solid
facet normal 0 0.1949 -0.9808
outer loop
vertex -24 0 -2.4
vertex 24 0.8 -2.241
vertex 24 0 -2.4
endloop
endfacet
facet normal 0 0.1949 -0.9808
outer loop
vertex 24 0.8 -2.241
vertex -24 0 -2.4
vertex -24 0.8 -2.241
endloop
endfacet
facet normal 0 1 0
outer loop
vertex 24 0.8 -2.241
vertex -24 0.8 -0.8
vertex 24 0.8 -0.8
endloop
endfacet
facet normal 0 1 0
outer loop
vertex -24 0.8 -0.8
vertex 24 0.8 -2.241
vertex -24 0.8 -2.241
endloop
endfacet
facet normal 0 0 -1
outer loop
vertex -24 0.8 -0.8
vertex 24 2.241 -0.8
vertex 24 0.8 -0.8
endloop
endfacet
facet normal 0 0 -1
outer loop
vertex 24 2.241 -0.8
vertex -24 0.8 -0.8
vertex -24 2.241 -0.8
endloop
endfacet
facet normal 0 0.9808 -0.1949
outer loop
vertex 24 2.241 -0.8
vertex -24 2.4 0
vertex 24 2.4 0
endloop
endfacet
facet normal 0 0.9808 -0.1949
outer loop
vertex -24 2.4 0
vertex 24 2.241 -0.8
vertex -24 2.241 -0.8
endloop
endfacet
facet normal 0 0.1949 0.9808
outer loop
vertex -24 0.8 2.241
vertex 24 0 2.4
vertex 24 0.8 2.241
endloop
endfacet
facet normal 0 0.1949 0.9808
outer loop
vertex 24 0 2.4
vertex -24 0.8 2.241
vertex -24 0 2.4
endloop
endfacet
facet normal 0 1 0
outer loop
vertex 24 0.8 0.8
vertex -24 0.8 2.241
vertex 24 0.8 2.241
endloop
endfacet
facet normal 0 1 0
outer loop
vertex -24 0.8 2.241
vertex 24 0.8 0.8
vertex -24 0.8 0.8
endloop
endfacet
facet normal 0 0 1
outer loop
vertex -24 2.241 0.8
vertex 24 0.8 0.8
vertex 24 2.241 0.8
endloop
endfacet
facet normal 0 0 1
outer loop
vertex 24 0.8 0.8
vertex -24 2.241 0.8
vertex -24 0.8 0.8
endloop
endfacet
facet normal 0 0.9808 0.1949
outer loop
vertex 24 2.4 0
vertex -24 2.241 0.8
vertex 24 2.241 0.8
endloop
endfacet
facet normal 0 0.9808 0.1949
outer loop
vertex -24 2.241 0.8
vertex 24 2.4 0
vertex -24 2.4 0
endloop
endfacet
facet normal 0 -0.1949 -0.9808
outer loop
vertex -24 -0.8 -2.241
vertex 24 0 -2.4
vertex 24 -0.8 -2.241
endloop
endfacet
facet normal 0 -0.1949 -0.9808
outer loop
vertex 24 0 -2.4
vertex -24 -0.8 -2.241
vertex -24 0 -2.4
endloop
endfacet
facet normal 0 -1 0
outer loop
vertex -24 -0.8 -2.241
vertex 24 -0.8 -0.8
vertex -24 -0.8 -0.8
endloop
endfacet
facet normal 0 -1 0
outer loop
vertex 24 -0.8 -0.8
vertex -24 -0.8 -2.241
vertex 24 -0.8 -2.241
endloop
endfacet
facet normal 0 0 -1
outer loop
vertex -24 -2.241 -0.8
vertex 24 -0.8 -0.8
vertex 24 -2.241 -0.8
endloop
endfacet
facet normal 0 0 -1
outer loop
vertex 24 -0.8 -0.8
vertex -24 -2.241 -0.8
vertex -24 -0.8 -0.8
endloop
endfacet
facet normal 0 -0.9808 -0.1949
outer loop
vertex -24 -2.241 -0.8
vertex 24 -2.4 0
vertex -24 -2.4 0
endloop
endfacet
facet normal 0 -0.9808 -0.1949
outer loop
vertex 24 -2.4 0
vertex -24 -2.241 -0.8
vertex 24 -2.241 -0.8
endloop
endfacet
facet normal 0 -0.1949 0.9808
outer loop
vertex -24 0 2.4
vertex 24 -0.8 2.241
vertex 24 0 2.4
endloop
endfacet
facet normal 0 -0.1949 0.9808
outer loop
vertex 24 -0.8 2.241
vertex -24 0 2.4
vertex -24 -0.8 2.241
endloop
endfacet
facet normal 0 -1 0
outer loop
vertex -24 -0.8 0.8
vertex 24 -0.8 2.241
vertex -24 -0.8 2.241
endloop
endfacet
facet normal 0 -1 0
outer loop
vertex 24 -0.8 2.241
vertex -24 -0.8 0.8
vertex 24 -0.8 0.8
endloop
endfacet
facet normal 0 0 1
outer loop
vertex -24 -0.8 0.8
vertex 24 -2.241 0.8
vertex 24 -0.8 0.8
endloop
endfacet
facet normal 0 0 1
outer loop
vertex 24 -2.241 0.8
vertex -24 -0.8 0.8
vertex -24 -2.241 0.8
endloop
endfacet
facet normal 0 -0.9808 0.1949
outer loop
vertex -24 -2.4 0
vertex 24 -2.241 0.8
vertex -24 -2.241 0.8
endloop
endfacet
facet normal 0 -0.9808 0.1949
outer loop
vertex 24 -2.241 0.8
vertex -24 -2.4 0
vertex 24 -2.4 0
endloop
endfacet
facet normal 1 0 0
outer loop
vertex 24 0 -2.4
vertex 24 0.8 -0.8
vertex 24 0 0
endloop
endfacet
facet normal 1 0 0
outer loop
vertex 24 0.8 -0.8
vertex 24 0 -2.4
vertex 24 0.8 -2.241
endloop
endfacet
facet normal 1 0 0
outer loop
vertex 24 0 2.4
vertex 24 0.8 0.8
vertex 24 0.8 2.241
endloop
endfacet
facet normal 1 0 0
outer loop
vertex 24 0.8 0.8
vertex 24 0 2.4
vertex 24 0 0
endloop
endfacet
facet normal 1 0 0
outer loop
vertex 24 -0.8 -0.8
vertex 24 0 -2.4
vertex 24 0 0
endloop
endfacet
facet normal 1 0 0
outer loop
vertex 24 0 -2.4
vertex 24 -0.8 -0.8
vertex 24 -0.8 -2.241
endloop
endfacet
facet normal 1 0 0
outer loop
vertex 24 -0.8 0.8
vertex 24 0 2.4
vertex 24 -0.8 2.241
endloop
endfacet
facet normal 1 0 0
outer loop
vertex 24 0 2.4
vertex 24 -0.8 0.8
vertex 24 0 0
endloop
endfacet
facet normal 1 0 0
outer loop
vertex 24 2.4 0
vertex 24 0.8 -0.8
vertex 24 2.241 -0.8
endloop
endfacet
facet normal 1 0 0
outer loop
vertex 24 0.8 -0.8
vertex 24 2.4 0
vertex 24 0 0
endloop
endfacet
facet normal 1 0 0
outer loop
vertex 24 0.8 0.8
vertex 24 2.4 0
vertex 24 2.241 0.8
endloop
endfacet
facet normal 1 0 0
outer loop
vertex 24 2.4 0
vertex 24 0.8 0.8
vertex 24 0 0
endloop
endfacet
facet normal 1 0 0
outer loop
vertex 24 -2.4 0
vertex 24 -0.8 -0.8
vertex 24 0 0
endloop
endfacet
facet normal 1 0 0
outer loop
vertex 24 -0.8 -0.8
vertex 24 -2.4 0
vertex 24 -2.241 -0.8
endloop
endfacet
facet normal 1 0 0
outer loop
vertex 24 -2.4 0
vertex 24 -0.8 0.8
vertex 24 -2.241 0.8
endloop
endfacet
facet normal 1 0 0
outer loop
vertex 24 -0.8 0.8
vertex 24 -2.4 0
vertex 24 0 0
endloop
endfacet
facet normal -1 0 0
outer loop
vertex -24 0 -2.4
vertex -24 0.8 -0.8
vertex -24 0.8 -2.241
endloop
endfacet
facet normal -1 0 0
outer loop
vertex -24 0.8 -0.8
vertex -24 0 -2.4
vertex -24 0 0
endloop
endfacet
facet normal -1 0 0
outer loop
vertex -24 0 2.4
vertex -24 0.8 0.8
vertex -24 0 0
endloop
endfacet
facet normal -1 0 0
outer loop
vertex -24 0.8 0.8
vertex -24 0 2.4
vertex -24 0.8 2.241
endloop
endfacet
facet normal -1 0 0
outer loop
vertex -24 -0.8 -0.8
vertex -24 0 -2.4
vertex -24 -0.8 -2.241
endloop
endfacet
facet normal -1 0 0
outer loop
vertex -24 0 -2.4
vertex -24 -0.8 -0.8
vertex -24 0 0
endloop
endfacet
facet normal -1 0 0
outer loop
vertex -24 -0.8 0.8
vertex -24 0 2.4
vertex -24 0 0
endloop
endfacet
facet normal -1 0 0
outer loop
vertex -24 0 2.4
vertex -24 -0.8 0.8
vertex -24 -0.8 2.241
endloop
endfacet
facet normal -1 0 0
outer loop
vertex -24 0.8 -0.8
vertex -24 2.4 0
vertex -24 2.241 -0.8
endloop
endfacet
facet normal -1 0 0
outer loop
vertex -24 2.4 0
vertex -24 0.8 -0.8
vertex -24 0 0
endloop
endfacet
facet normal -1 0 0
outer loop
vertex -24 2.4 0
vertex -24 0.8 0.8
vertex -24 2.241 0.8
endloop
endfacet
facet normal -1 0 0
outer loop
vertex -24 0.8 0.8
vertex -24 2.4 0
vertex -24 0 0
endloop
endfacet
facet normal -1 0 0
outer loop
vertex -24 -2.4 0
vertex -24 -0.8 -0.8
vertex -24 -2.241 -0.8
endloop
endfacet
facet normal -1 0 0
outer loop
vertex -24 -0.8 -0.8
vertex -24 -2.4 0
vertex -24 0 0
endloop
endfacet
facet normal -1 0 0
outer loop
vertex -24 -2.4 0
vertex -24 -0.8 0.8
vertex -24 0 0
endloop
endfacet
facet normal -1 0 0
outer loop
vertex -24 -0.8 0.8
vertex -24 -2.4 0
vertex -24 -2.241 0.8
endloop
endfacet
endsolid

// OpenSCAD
// file: ../p/axle.scad
use <../lib.scad>
function ldraw_lib__axle() = [
// 0 Axle
// 0 Name: axle.dat
// 0 Author: James Jessiman
// 0 !LDRAW_ORG Primitive UPDATE 2003-01
// 0 !LICENSE Licensed under CC BY 4.0 : see CAreadme.txt
// 
// 0 BFC CERTIFY CCW
  [0,"BFC","CERTIFY"],
  [0,"BFC","CCW"],
// 
// 0 !HISTORY 2000-04-23 [sbliss] Added conditional edges along outermost diameters
// 0 !HISTORY 2000-05-07 [PTadmin] Official Update 2000-01
// 0 !HISTORY 2002-11-08 [OrionP] Adjusted fit and precision
// 0 !HISTORY 2003-03-12 [PTadmin] Official Update 2003-01
// 0 !HISTORY 2007-06-24 [PTadmin] Header formatted for Contributor Agreement
// 0 !HISTORY 2008-07-01 [PTadmin] Official Update 2008-01
// 
// 
// 5 24 6 0 0 6 1 0 5.602 0 2 5.602 0 -2
  [5,24,6,0,0,6,1,0,5.602,0,2,5.602,0,-2],
// 5 24 0 0 6 0 1 6 2 0 5.602 -2 0 5.602
  [5,24,0,0,6,0,1,6,2,0,5.602,-2,0,5.602],
// 5 24 -6 0 0 -6 1 0 -5.602 0 -2 -5.602 0 2
  [5,24,-6,0,0,-6,1,0,-5.602,0,-2,-5.602,0,2],
// 5 24 0 0 -6 0 1 -6 -2 0 -5.602 2 0 -5.602
  [5,24,0,0,-6,0,1,-6,-2,0,-5.602,2,0,-5.602],
// 
// 2 24 6 0 0 5.602 0 2
  [2,24,6,0,0,5.602,0,2],
// 2 24 5.602 0 2 2 0 2
  [2,24,5.602,0,2,2,0,2],
// 2 24 2 0 2 2 0 5.602
  [2,24,2,0,2,2,0,5.602],
// 2 24 2 0 5.602 0 0 6
  [2,24,2,0,5.602,0,0,6],
// 2 24 -6 0 0 -5.602 0 2
  [2,24,-6,0,0,-5.602,0,2],
// 2 24 -5.602 0 2 -2 0 2
  [2,24,-5.602,0,2,-2,0,2],
// 2 24 -2 0 2 -2 0 5.602
  [2,24,-2,0,2,-2,0,5.602],
// 2 24 -2 0 5.602 -0 0 6
  [2,24,-2,0,5.602,-0,0,6],
// 2 24 6 0 -0 5.602 0 -2
  [2,24,6,0,-0,5.602,0,-2],
// 2 24 5.602 0 -2 2 0 -2
  [2,24,5.602,0,-2,2,0,-2],
// 2 24 2 0 -2 2 0 -5.602
  [2,24,2,0,-2,2,0,-5.602],
// 2 24 2 0 -5.602 0 0 -6
  [2,24,2,0,-5.602,0,0,-6],
// 2 24 -6 0 -0 -5.602 0 -2
  [2,24,-6,0,-0,-5.602,0,-2],
// 2 24 -5.602 0 -2 -2 0 -2
  [2,24,-5.602,0,-2,-2,0,-2],
// 2 24 -2 0 -2 -2 0 -5.602
  [2,24,-2,0,-2,-2,0,-5.602],
// 2 24 -2 0 -5.602 -0 0 -6
  [2,24,-2,0,-5.602,-0,0,-6],
// 2 24 6 1 0 5.602 1 2
  [2,24,6,1,0,5.602,1,2],
// 2 24 5.602 1 2 2 1 2
  [2,24,5.602,1,2,2,1,2],
// 2 24 2 1 2 2 1 5.602
  [2,24,2,1,2,2,1,5.602],
// 2 24 2 1 5.602 0 1 6
  [2,24,2,1,5.602,0,1,6],
// 2 24 -6 1 0 -5.602 1 2
  [2,24,-6,1,0,-5.602,1,2],
// 2 24 -5.602 1 2 -2 1 2
  [2,24,-5.602,1,2,-2,1,2],
// 2 24 -2 1 2 -2 1 5.602
  [2,24,-2,1,2,-2,1,5.602],
// 2 24 -2 1 5.602 -0 1 6
  [2,24,-2,1,5.602,-0,1,6],
// 2 24 6 1 -0 5.602 1 -2
  [2,24,6,1,-0,5.602,1,-2],
// 2 24 5.602 1 -2 2 1 -2
  [2,24,5.602,1,-2,2,1,-2],
// 2 24 2 1 -2 2 1 -5.602
  [2,24,2,1,-2,2,1,-5.602],
// 2 24 2 1 -5.602 0 1 -6
  [2,24,2,1,-5.602,0,1,-6],
// 2 24 -6 1 -0 -5.602 1 -2
  [2,24,-6,1,-0,-5.602,1,-2],
// 2 24 -5.602 1 -2 -2 1 -2
  [2,24,-5.602,1,-2,-2,1,-2],
// 2 24 -2 1 -2 -2 1 -5.602
  [2,24,-2,1,-2,-2,1,-5.602],
// 2 24 -2 1 -5.602 -0 1 -6
  [2,24,-2,1,-5.602,-0,1,-6],
// 
// 2 24 5.602 0 2 5.602 1 2
  [2,24,5.602,0,2,5.602,1,2],
// 2 24 2 0 2 2 1 2
  [2,24,2,0,2,2,1,2],
// 2 24 2 0 5.602 2 1 5.602
  [2,24,2,0,5.602,2,1,5.602],
// 2 24 -5.602 0 2 -5.602 1 2
  [2,24,-5.602,0,2,-5.602,1,2],
// 2 24 -2 0 2 -2 1 2
  [2,24,-2,0,2,-2,1,2],
// 2 24 -2 0 5.602 -2 1 5.602
  [2,24,-2,0,5.602,-2,1,5.602],
// 2 24 5.602 0 -2 5.602 1 -2
  [2,24,5.602,0,-2,5.602,1,-2],
// 2 24 2 0 -2 2 1 -2
  [2,24,2,0,-2,2,1,-2],
// 2 24 2 0 -5.602 2 1 -5.602
  [2,24,2,0,-5.602,2,1,-5.602],
// 2 24 -5.602 0 -2 -5.602 1 -2
  [2,24,-5.602,0,-2,-5.602,1,-2],
// 2 24 -2 0 -2 -2 1 -2
  [2,24,-2,0,-2,-2,1,-2],
// 2 24 -2 0 -5.602 -2 1 -5.602
  [2,24,-2,0,-5.602,-2,1,-5.602],
// 
// 4 16 6 0 0 6 1 0 5.602 1 2 5.602 0 2
  [4,16,6,0,0,6,1,0,5.602,1,2,5.602,0,2],
// 4 16 5.602 0 2 5.602 1 2 2 1 2 2 0 2
  [4,16,5.602,0,2,5.602,1,2,2,1,2,2,0,2],
// 4 16 2 0 2 2 1 2 2 1 5.602 2 0 5.602
  [4,16,2,0,2,2,1,2,2,1,5.602,2,0,5.602],
// 4 16 2 0 5.602 2 1 5.602 0 1 6 0 0 6
  [4,16,2,0,5.602,2,1,5.602,0,1,6,0,0,6],
// 4 16 -6 0 0 -5.602 0 2 -5.602 1 2 -6 1 0
  [4,16,-6,0,0,-5.602,0,2,-5.602,1,2,-6,1,0],
// 4 16 -5.602 0 2 -2 0 2 -2 1 2 -5.602 1 2
  [4,16,-5.602,0,2,-2,0,2,-2,1,2,-5.602,1,2],
// 4 16 -2 0 2 -2 0 5.602 -2 1 5.602 -2 1 2
  [4,16,-2,0,2,-2,0,5.602,-2,1,5.602,-2,1,2],
// 4 16 -2 0 5.602 -0 0 6 -0 1 6 -2 1 5.602
  [4,16,-2,0,5.602,-0,0,6,-0,1,6,-2,1,5.602],
// 4 16 6 0 -0 5.602 0 -2 5.602 1 -2 6 1 -0
  [4,16,6,0,-0,5.602,0,-2,5.602,1,-2,6,1,-0],
// 4 16 5.602 0 -2 2 0 -2 2 1 -2 5.602 1 -2
  [4,16,5.602,0,-2,2,0,-2,2,1,-2,5.602,1,-2],
// 4 16 2 0 -2 2 0 -5.602 2 1 -5.602 2 1 -2
  [4,16,2,0,-2,2,0,-5.602,2,1,-5.602,2,1,-2],
// 4 16 2 0 -5.602 0 0 -6 0 1 -6 2 1 -5.602
  [4,16,2,0,-5.602,0,0,-6,0,1,-6,2,1,-5.602],
// 4 16 -6 0 -0 -6 1 -0 -5.602 1 -2 -5.602 0 -2
  [4,16,-6,0,-0,-6,1,-0,-5.602,1,-2,-5.602,0,-2],
// 4 16 -5.602 0 -2 -5.602 1 -2 -2 1 -2 -2 0 -2
  [4,16,-5.602,0,-2,-5.602,1,-2,-2,1,-2,-2,0,-2],
// 4 16 -2 0 -2 -2 1 -2 -2 1 -5.602 -2 0 -5.602
  [4,16,-2,0,-2,-2,1,-2,-2,1,-5.602,-2,0,-5.602],
// 4 16 -2 0 -5.602 -2 1 -5.602 -0 1 -6 -0 0 -6
  [4,16,-2,0,-5.602,-2,1,-5.602,-0,1,-6,-0,0,-6],
// 
// 4 16 6 0 0 5.602 0 2 2 0 2 0 0 0
  [4,16,6,0,0,5.602,0,2,2,0,2,0,0,0],
// 4 16 -6 0 0 0 0 0 -2 0 2 -5.602 0 2
  [4,16,-6,0,0,0,0,0,-2,0,2,-5.602,0,2],
// 4 16 6 0 0 0 0 0 2 0 -2 5.602 0 -2
  [4,16,6,0,0,0,0,0,2,0,-2,5.602,0,-2],
// 4 16 -6 0 0 -5.602 0 -2 -2 0 -2 0 0 0
  [4,16,-6,0,0,-5.602,0,-2,-2,0,-2,0,0,0],
// 4 16 0 0 6 0 0 0 2 0 2 2 0 5.602
  [4,16,0,0,6,0,0,0,2,0,2,2,0,5.602],
// 4 16 0 0 6 -2 0 5.602 -2 0 2 0 0 0
  [4,16,0,0,6,-2,0,5.602,-2,0,2,0,0,0],
// 4 16 0 0 -6 2 0 -5.602 2 0 -2 0 0 0
  [4,16,0,0,-6,2,0,-5.602,2,0,-2,0,0,0],
// 4 16 0 0 -6 0 0 0 -2 0 -2 -2 0 -5.602
  [4,16,0,0,-6,0,0,0,-2,0,-2,-2,0,-5.602],
// 4 16 6 1 0 0 1 0 2 1 2 5.602 1 2
  [4,16,6,1,0,0,1,0,2,1,2,5.602,1,2],
// 4 16 -6 1 0 -5.602 1 2 -2 1 2 0 1 0
  [4,16,-6,1,0,-5.602,1,2,-2,1,2,0,1,0],
// 4 16 6 1 0 5.602 1 -2 2 1 -2 0 1 0
  [4,16,6,1,0,5.602,1,-2,2,1,-2,0,1,0],
// 4 16 -6 1 0 0 1 0 -2 1 -2 -5.602 1 -2
  [4,16,-6,1,0,0,1,0,-2,1,-2,-5.602,1,-2],
// 4 16 0 1 6 2 1 5.602 2 1 2 0 1 0
  [4,16,0,1,6,2,1,5.602,2,1,2,0,1,0],
// 4 16 0 1 6 0 1 0 -2 1 2 -2 1 5.602
  [4,16,0,1,6,0,1,0,-2,1,2,-2,1,5.602],
// 4 16 0 1 -6 0 1 0 2 1 -2 2 1 -5.602
  [4,16,0,1,-6,0,1,0,2,1,-2,2,1,-5.602],
// 4 16 0 1 -6 -2 1 -5.602 -2 1 -2 0 1 0
  [4,16,0,1,-6,-2,1,-5.602,-2,1,-2,0,1,0],
// 0
];
module ldraw_lib__axle(step=0, col=false, unit=2/5, alt=false, line=0.2, solid=!$preview)
    makepoly(ldraw_lib__axle(), step=step, col=col, unit=unit, alt=alt, line=line, solid=solid);
ldraw_lib__axle(line=0.2);
// main file
use <../lib.scad>
use <../p/axle.scad>
function ldraw_lib__3706() = [
// 0 Technic Axle  6
// 0 Name: 3706.dat
// 0 Author: James Jessiman
// 0 !LDRAW_ORG Part UPDATE 2005-01
// 0 !LICENSE Licensed under CC BY 4.0 : see CAreadme.txt
// 
// 0 BFC CERTIFY CCW
  [0,"BFC","CERTIFY"],
  [0,"BFC","CCW"],
// 
// 0 !HISTORY 2004-07-11 [guyvivan] BFC'ed
// 0 !HISTORY 2005-12-28 [PTadmin] Official Update 2005-01
// 0 !HISTORY 2007-06-29 [PTadmin] Header formatted for Contributor Agreement
// 0 !HISTORY 2008-07-01 [PTadmin] Official Update 2008-01
// 
// 
// 1 16 60 0 0 0 -120 0 1 0 0 0 0 1 axle.dat
  [1,16,60,0,0,0,-120,0,1,0,0,0,0,1, ldraw_lib__axle()],
// 0
// 
];
module ldraw_lib__3706(step=0, col=false, unit=2/5, alt=false, line=0.2, solid=!$preview)
    makepoly(ldraw_lib__3706(), step=step, col=col, unit=unit, alt=alt, line=line, solid=solid);
ldraw_lib__3706(line=0.2);
